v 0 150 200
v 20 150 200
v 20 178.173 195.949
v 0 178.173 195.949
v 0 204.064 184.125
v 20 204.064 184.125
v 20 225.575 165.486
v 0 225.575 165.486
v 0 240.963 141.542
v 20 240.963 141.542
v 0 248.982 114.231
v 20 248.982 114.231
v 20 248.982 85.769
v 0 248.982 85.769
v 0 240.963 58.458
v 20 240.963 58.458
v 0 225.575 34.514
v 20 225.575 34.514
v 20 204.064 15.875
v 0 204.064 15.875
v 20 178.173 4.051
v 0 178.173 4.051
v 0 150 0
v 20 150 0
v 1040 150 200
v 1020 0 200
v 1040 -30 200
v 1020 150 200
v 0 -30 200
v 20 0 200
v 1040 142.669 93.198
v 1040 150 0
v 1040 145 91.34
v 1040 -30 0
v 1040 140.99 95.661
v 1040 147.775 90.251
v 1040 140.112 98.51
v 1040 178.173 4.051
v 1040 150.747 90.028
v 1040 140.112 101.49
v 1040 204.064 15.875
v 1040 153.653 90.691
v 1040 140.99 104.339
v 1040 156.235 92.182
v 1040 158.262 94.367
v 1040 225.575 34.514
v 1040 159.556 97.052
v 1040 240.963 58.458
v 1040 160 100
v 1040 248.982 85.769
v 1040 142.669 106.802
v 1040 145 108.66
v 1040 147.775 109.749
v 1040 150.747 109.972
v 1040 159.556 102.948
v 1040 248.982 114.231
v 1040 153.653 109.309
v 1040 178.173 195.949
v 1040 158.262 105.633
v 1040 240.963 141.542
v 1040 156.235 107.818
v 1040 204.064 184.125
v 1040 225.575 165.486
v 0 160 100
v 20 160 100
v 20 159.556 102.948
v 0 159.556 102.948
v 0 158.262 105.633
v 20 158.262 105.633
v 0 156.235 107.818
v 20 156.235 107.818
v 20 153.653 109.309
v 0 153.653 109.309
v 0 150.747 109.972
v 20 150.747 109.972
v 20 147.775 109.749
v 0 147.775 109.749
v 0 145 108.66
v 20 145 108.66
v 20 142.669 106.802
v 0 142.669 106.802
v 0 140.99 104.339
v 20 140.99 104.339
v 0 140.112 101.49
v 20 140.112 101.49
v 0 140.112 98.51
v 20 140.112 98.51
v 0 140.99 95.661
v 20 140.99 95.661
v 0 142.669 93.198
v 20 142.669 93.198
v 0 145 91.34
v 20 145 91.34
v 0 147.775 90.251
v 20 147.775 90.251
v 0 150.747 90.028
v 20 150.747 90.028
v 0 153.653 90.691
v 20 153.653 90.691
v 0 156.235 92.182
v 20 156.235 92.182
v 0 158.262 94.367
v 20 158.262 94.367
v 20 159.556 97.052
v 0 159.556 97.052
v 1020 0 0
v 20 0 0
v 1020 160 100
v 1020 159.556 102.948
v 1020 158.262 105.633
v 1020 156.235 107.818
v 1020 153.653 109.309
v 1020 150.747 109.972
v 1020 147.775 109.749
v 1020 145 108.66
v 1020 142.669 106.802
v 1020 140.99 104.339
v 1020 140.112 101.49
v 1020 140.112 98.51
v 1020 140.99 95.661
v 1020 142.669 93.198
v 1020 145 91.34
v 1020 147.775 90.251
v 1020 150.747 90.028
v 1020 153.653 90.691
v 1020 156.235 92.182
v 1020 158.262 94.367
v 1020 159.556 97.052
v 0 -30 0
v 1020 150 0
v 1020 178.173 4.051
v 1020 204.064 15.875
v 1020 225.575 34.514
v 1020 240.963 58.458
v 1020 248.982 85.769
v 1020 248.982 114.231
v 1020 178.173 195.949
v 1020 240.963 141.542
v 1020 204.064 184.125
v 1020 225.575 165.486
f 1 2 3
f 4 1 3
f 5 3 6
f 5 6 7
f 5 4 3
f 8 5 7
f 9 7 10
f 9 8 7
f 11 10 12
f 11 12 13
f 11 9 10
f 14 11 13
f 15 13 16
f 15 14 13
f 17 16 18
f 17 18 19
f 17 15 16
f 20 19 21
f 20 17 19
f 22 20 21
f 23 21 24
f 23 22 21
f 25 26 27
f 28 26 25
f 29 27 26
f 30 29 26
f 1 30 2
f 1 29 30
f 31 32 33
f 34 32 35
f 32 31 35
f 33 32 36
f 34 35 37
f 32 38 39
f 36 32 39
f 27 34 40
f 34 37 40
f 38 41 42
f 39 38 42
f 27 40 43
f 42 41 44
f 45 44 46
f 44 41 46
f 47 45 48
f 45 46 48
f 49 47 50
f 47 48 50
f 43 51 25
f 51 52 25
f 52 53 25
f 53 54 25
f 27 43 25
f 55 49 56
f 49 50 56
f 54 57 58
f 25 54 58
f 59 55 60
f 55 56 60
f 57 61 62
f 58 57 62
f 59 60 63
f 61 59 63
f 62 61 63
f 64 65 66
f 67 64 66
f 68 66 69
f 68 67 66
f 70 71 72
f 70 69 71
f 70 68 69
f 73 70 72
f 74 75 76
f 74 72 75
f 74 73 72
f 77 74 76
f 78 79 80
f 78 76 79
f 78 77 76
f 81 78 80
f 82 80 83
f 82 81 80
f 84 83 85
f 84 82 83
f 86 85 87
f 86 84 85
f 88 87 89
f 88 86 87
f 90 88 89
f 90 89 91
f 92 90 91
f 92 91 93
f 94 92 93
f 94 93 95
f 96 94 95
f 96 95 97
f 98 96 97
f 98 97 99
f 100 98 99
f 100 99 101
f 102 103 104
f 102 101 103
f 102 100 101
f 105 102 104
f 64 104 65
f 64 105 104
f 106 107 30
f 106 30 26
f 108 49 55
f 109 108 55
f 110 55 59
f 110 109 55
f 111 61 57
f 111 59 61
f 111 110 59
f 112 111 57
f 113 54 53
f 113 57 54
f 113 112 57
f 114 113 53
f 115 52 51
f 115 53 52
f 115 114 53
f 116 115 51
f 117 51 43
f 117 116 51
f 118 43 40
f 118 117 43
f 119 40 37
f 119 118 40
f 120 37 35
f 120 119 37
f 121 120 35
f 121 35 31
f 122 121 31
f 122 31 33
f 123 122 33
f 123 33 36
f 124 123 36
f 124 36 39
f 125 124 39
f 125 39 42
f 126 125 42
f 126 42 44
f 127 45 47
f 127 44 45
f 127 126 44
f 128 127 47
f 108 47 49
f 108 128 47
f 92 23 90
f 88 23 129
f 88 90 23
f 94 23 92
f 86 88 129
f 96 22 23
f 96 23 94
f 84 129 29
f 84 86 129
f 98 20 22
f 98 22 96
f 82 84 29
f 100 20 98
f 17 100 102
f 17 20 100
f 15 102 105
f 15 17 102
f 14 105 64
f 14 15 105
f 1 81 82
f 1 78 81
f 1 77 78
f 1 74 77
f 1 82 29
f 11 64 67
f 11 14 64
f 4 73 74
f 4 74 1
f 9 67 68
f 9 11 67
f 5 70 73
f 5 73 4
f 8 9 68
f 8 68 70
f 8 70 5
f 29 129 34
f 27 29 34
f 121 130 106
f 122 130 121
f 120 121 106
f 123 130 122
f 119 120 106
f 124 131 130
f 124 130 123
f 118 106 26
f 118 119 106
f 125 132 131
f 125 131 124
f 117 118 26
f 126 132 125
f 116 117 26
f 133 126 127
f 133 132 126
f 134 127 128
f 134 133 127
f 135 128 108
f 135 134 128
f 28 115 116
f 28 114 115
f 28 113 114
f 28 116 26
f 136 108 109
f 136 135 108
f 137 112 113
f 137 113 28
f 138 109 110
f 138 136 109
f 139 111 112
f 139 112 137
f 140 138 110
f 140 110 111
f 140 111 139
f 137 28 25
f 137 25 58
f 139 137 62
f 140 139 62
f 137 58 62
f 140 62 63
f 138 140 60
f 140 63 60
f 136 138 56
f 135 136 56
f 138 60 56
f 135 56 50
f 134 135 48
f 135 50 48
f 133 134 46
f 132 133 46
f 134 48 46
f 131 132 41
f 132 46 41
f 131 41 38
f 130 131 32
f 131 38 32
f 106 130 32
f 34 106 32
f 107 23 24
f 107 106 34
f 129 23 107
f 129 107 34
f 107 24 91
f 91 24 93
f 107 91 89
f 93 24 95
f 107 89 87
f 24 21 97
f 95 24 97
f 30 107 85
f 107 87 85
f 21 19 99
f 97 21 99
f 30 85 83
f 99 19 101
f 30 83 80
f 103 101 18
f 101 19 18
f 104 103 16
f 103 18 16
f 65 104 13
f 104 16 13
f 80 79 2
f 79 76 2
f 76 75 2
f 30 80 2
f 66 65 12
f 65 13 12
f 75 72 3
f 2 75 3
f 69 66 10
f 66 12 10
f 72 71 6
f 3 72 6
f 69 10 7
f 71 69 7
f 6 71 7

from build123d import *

# Parameters (mm, degrees)
SKETCH1_W               = 1040
SKETCH1_H               = 30
BOSS_EXTRUDE1_DEPTH     = 200
BOSS_EXTRUDE3_DEPTH     = 20
CUT_EXTRUDE1_DEPTH      = 1070.065012055
CUT_EXTRUDE1_DEPTH_BACK = 1070.065012055
SKETCH3_R               = 10


with BuildPart() as part:
    # Sketch1 → Boss-Extrude1 (new body)
    with BuildSketch(Plane.XY):
        with Locations((520, -15)):
            Rectangle(SKETCH1_W, SKETCH1_H)
    extrude(amount=BOSS_EXTRUDE1_DEPTH)

    # Sketch2 → Boss-Extrude3 (add)
    with BuildSketch(Plane(origin=(1040, 0, 0), x_dir=(0, 0, -1), z_dir=(1, 0, 0))):
        with BuildLine():
            Line((-200, 0), (-200, 150))
            ThreePointArc((-200, 150), (-100, 250), (0, 150))
            Line((0, 150), (0, 0))
            Line((0, 0), (-200, 0))
        make_face()
    boss_extrude3 = extrude(amount=-BOSS_EXTRUDE3_DEPTH)

    # Mirror2: Boss-Extrude3 across plane
    add(boss_extrude3.mirror(Plane(origin=(520, 0, 0), x_dir=(0, 0, 1), z_dir=(1, 0, 0))))

    # Sketch3 → Cut-Extrude1 (cut, two sides: drawn at the far end of the back side and taken through both)
    with BuildSketch(Plane(origin=(20, 0, 0), x_dir=(0, 0, -1), z_dir=(1, 0, 0)).offset(-CUT_EXTRUDE1_DEPTH_BACK)):
        with Locations(Location((-100, 150, 0), (0, 0, 90))):
            Circle(SKETCH3_R)
    extrude(amount=CUT_EXTRUDE1_DEPTH + CUT_EXTRUDE1_DEPTH_BACK, mode=Mode.SUBTRACT)


solid = part.part
